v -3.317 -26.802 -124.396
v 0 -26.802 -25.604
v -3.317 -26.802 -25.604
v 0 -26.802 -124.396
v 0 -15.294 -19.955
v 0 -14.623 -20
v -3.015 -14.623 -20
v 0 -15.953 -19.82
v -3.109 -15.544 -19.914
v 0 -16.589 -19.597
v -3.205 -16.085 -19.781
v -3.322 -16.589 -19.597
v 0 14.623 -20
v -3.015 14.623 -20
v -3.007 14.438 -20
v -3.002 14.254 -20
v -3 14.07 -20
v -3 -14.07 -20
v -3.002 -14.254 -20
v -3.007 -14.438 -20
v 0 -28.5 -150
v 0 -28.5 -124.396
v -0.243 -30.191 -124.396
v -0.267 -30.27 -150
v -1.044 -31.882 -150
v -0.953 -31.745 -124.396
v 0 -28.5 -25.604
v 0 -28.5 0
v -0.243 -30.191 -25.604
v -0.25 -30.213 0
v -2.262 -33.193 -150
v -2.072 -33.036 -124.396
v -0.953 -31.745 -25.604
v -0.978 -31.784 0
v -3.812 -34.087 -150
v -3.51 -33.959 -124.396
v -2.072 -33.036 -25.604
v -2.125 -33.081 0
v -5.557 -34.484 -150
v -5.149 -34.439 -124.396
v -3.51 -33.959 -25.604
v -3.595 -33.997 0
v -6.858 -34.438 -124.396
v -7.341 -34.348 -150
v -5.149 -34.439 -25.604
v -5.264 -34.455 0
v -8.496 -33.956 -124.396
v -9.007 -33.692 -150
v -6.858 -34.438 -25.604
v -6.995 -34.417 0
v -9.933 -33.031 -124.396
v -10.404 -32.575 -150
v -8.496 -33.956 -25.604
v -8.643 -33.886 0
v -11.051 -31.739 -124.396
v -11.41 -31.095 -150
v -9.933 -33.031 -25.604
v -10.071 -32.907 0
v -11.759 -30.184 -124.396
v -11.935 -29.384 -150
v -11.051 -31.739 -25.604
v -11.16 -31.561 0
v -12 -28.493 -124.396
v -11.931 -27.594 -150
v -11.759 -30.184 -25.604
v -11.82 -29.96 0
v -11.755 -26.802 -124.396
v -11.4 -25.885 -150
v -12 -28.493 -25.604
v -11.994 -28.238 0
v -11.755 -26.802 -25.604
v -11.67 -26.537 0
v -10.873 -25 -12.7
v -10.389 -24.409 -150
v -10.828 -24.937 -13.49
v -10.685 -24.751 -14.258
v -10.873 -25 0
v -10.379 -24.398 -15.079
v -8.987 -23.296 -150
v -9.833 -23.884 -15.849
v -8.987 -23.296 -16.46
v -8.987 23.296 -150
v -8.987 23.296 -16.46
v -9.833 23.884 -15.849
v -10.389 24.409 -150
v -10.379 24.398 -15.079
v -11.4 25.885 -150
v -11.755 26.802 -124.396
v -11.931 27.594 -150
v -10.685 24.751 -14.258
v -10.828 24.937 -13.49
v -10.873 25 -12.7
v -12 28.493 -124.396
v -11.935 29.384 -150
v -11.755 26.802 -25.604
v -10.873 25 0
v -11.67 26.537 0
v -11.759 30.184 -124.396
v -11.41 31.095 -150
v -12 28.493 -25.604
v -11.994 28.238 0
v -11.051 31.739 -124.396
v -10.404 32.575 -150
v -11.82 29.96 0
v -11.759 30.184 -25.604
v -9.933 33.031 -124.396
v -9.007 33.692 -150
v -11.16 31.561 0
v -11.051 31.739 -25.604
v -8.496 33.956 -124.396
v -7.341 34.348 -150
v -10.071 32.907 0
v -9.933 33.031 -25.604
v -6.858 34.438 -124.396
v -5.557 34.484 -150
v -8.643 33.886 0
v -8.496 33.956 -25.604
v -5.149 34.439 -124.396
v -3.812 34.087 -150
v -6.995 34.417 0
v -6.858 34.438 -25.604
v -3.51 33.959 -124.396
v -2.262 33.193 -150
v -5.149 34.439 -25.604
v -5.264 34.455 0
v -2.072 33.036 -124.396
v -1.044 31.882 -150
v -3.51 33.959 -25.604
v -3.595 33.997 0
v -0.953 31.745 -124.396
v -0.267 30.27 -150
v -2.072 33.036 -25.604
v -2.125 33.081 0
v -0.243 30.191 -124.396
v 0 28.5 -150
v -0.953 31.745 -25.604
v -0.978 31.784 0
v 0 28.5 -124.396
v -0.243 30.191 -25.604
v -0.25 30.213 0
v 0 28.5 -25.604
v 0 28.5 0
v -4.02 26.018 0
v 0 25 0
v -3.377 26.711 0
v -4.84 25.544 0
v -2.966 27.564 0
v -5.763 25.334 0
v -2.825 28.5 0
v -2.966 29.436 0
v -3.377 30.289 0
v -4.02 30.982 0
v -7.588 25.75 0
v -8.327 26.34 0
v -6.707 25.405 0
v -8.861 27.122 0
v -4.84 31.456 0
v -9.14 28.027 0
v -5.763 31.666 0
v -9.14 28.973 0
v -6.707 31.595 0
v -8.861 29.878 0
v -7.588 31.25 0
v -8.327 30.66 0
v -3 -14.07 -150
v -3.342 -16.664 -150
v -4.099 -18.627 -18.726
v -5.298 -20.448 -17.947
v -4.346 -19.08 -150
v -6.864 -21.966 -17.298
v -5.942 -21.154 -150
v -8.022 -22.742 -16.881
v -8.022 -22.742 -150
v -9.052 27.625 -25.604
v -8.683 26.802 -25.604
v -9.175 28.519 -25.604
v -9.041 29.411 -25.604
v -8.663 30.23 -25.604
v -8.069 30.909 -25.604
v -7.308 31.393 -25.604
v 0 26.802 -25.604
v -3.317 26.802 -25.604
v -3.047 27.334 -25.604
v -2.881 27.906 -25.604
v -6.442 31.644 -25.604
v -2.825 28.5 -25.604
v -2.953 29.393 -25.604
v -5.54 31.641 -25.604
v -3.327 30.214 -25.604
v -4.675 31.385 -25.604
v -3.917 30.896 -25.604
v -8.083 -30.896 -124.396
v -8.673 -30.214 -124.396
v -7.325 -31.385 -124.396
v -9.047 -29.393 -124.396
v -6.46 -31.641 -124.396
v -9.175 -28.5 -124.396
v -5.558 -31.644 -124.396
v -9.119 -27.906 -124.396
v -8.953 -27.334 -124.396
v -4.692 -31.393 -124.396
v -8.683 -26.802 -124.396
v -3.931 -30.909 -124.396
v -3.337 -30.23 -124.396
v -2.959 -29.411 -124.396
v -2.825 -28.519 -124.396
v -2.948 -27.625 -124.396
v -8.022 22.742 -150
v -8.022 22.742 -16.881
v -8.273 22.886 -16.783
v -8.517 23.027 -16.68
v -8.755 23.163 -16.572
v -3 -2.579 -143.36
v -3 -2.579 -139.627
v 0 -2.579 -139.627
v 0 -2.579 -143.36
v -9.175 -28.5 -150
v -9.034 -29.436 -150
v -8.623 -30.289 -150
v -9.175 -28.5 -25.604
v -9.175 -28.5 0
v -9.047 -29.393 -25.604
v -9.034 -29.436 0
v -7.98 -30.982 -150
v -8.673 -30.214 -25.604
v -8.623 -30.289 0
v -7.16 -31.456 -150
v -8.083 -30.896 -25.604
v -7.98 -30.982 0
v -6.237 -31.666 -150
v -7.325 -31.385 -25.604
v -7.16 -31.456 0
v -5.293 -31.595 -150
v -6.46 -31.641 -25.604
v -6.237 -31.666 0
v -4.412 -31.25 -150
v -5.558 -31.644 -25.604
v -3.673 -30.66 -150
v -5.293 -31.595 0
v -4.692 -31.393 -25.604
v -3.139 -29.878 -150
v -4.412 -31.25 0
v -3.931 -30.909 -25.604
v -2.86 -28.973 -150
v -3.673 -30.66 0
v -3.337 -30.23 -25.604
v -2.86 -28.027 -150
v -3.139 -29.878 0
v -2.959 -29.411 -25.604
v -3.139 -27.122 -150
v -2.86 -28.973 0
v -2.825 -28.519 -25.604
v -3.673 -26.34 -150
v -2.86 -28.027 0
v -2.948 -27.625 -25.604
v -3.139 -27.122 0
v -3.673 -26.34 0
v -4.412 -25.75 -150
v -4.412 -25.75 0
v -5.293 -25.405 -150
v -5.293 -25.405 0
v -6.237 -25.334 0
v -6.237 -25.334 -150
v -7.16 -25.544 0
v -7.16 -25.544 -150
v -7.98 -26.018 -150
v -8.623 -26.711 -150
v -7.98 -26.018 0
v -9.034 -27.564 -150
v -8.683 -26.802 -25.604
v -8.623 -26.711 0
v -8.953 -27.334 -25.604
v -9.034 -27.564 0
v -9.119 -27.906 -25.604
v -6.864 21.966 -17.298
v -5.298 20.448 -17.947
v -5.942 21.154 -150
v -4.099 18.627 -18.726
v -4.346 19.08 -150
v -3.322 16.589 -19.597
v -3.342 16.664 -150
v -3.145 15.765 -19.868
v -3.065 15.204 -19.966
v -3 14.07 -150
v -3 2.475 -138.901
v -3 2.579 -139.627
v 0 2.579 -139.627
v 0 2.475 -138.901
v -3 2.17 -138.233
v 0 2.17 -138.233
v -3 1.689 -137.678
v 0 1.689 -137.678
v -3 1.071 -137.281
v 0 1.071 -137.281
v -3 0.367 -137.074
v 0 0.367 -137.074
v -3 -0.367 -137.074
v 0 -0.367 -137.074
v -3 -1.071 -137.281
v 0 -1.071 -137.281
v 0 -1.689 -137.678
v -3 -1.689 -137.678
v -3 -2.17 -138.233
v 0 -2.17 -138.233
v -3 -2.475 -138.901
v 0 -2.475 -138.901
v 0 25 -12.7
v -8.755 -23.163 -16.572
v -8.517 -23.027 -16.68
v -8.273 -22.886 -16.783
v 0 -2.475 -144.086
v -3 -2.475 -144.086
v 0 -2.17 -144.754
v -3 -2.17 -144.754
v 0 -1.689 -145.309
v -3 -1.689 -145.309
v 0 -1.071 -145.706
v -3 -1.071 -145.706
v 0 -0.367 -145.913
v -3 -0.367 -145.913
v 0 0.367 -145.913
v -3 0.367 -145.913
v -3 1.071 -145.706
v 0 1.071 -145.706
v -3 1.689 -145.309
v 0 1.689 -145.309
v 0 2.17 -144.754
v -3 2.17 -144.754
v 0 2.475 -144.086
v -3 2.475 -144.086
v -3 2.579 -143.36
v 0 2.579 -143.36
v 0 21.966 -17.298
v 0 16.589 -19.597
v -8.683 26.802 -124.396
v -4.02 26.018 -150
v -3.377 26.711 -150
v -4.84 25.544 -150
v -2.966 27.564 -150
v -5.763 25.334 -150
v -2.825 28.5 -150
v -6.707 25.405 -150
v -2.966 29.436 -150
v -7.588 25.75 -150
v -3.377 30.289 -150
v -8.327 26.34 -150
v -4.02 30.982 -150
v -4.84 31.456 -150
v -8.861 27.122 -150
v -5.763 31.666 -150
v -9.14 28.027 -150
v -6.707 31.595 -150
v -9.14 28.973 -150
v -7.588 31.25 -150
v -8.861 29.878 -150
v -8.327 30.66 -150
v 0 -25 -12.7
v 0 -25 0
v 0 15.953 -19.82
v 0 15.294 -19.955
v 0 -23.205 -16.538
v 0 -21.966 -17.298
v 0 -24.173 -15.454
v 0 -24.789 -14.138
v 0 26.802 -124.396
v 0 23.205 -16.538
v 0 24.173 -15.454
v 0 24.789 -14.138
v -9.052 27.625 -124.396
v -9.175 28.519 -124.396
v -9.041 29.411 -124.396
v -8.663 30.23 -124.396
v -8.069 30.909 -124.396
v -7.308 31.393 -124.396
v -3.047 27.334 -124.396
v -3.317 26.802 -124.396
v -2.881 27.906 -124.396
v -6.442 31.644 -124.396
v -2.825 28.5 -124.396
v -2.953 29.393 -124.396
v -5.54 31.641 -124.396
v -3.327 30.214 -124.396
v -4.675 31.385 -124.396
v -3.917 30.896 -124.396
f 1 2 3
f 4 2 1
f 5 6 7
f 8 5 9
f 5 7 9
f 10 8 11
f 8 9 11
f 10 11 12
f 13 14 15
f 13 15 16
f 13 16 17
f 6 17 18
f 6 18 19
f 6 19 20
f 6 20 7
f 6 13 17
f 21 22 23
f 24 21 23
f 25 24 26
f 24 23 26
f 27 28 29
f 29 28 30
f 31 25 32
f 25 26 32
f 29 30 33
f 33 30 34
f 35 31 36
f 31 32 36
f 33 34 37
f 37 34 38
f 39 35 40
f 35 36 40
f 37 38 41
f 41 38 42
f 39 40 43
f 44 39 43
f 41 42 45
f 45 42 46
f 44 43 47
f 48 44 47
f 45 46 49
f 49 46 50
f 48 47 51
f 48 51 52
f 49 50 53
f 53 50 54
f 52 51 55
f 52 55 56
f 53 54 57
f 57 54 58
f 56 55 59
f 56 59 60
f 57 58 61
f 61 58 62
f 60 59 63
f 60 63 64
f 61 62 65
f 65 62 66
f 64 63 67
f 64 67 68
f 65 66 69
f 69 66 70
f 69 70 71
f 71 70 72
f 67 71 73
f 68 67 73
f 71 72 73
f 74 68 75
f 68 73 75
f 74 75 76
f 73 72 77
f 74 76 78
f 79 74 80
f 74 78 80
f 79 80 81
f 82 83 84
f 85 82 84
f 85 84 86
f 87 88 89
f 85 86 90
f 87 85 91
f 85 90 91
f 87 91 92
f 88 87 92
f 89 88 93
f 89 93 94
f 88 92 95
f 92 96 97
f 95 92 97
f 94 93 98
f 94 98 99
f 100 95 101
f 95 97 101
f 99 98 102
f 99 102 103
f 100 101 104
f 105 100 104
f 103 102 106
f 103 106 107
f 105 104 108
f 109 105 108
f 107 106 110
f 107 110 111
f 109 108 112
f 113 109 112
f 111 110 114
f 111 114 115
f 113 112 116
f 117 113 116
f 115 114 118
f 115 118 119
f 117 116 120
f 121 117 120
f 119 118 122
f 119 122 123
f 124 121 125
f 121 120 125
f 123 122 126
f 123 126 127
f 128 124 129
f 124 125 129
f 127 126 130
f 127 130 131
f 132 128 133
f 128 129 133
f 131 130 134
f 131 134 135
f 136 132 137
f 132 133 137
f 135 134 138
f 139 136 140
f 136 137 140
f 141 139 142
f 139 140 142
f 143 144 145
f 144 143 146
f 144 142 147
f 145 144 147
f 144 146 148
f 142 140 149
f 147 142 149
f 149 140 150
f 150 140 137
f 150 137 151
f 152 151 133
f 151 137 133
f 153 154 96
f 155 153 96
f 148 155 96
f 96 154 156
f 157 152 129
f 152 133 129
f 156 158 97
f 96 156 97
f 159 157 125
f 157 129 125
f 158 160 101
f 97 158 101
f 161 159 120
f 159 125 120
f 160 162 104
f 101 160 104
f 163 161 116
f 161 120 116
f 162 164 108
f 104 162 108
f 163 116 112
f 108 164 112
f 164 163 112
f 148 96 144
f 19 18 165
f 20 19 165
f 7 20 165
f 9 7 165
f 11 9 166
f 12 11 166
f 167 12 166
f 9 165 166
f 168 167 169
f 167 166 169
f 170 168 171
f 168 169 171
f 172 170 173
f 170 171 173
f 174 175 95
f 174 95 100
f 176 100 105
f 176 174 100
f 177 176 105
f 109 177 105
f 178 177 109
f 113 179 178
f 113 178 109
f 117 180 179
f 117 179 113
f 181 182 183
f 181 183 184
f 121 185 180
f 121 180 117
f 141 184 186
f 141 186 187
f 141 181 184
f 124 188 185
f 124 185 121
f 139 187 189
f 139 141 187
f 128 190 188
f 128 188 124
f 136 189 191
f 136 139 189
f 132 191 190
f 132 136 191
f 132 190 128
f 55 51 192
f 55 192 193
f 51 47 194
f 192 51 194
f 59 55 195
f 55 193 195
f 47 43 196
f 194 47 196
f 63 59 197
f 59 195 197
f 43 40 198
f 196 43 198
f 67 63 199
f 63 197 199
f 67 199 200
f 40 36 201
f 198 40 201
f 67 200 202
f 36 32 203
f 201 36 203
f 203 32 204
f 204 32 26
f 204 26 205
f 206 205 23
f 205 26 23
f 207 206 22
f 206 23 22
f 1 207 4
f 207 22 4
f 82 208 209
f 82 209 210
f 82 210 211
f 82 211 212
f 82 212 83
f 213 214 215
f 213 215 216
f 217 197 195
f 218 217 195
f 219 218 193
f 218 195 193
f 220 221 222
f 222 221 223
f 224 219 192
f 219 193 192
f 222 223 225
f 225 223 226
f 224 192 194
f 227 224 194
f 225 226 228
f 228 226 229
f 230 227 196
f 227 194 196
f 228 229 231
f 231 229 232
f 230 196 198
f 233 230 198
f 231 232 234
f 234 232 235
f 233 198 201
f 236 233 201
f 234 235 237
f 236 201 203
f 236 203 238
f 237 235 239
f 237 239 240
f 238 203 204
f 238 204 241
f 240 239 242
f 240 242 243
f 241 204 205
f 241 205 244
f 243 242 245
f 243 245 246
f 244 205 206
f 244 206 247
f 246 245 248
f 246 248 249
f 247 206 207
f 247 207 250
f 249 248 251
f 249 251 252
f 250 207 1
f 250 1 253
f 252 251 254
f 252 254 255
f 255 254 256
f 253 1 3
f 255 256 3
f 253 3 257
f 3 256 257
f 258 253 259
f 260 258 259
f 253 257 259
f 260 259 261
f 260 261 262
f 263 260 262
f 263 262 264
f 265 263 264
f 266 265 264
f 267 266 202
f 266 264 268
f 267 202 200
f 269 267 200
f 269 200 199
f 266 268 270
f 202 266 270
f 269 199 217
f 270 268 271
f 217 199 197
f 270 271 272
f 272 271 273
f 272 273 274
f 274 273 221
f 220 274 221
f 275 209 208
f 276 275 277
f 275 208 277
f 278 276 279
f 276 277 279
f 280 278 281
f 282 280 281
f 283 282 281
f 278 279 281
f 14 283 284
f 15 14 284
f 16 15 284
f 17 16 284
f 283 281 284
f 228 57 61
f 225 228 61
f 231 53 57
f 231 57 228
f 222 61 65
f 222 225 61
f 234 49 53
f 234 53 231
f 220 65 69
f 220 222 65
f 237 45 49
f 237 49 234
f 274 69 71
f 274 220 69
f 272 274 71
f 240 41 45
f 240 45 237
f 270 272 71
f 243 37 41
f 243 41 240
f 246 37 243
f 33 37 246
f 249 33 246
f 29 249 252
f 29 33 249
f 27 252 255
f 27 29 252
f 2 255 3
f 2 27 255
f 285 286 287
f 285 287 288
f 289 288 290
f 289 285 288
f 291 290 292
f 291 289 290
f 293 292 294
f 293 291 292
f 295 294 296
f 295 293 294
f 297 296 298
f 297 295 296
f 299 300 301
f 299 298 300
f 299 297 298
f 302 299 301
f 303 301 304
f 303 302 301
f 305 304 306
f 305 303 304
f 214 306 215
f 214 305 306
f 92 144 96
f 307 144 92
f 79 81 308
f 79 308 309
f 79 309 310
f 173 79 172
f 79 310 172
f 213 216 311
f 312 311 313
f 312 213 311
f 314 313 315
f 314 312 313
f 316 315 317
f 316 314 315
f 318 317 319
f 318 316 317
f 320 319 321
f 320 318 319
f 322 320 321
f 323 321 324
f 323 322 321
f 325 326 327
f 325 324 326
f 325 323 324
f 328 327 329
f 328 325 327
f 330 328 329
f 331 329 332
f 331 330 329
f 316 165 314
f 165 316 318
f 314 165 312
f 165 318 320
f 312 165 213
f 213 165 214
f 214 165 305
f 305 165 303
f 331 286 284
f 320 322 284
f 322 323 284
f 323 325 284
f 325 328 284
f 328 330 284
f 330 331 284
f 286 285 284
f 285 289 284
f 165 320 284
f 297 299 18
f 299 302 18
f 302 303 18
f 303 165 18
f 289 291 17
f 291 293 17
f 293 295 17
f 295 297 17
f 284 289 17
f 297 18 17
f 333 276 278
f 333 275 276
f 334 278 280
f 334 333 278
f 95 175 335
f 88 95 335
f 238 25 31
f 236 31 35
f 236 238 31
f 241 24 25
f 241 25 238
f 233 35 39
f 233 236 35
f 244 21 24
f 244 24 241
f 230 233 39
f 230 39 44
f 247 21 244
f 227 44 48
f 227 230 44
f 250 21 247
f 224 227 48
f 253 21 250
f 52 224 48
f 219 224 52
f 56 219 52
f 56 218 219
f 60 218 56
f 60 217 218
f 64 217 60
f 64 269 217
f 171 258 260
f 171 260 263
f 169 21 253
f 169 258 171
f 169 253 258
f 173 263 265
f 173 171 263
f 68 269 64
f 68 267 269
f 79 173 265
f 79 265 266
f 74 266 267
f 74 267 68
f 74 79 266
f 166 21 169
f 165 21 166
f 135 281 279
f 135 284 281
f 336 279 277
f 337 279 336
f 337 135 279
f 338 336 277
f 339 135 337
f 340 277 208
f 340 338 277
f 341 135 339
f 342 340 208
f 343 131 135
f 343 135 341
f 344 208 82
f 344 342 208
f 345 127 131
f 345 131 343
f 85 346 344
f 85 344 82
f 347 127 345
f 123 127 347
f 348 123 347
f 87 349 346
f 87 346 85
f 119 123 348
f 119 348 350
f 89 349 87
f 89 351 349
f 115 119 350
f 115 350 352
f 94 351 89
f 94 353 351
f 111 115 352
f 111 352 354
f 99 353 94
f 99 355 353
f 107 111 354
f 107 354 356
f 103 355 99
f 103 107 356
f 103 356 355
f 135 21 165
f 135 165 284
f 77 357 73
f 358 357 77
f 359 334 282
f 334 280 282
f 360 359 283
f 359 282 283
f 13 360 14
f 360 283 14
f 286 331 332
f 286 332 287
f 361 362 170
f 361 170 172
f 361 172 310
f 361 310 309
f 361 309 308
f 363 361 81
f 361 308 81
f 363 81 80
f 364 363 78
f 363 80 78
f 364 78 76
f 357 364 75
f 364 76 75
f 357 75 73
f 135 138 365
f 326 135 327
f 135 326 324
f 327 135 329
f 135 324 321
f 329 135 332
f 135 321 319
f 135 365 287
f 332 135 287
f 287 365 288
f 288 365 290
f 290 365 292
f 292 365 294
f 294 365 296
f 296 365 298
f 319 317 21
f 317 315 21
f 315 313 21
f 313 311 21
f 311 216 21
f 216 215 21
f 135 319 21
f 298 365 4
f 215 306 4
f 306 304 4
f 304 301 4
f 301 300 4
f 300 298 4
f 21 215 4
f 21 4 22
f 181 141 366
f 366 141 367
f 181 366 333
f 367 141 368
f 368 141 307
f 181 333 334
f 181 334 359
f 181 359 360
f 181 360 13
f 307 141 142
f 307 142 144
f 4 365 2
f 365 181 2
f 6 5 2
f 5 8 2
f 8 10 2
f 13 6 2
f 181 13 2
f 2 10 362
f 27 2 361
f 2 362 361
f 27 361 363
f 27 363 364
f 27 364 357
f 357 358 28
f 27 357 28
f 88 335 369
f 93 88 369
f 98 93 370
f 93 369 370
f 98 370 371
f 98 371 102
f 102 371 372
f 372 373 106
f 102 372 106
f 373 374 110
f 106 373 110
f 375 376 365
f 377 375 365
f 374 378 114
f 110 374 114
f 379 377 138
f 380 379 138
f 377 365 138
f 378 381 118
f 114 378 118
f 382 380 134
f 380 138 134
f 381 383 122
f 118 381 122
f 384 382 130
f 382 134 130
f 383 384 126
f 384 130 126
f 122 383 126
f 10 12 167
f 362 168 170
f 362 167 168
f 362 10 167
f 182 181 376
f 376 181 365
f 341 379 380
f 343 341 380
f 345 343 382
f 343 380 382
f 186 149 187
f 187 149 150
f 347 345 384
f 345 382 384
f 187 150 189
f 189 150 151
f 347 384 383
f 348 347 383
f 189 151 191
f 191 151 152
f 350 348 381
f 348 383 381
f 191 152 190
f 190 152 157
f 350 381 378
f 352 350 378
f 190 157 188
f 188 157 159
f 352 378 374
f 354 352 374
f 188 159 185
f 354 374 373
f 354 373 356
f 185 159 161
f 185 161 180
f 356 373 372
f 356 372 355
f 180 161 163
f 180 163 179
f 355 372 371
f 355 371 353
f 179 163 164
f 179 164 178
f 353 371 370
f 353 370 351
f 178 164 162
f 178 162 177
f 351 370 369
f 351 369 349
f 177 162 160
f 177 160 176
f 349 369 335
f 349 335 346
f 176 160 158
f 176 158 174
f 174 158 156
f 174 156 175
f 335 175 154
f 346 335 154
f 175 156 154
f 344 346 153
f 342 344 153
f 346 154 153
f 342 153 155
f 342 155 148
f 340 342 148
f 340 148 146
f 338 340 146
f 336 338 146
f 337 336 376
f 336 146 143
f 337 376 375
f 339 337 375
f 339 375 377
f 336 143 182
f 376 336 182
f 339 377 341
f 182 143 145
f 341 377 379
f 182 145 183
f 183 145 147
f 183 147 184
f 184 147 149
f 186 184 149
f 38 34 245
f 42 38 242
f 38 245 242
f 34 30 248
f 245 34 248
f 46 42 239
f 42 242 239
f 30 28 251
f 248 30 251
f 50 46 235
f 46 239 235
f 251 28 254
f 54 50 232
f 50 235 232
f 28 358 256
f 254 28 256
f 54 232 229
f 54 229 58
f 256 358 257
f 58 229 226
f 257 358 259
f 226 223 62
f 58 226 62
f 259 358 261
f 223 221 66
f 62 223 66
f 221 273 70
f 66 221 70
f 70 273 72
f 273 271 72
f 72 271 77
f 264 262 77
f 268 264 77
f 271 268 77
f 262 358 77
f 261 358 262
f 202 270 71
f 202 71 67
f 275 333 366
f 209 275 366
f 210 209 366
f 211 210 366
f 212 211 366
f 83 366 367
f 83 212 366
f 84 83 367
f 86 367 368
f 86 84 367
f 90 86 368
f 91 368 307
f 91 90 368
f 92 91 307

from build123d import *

# Parameters (mm, degrees)
CROQUIS1_R              = 3.175
SALIENTE_EXTRUIR1_DEPTH = 150
REDONDEO1_R             = 10
CORTAR_EXTRUIR1_DEPTH   = 155.383451186
REDONDEO2_R             = 5
CROQUIS3_W              = 98.791812306
CROQUIS3_H              = 18.145434914
CORTAR_EXTRUIR2_DEPTH   = 155.383451313
CORTAR_EXTRUIR3_DEPTH   = 155.179278889


with BuildPart() as part:
    # Croquis1 → Saliente-Extruir1 (new body)
    with BuildSketch(Plane.XY):
        with BuildLine():
            Line((-3, 19.859827637), (-8.98691391, 23.296314259))
            ThreePointArc((-8.98691391, 23.296314259), (-9.006535925, 33.69237342), (0, 28.5))
            Line((0, 28.5), (0, -28.5))
            ThreePointArc((0, -28.5), (-9.006535925, -33.69237342), (-8.98691391, -23.296314259))
            Line((-8.98691391, -23.296314259), (-3, -19.859827637))
            Line((-3, -19.859827637), (-3, 19.859827637))
        make_face()
        with Locations((-6, 28.5)):
            Circle(CROQUIS1_R, mode=Mode.SUBTRACT)
        with Locations(Location((-6, -28.5, 0), (0, 0, 180))):
            Circle(CROQUIS1_R, mode=Mode.SUBTRACT)
    extrude(amount=-SALIENTE_EXTRUIR1_DEPTH)

    # Redondeo1
    redondeo1_edges = [part.edges().sort_by_distance(p)[0] for p in [
        (-3, -19.859827637, -75),
        (-3, 19.859827637, -75),
    ]]
    fillet(redondeo1_edges, radius=REDONDEO1_R)

    # Croquis2 → Cortar-Extruir1 (cut, through all)
    with BuildSketch(Plane(origin=(0, 0, 0), x_dir=(0, 0, -1), z_dir=(1, 0, 0))):
        Polygon((16, 25), (20, 15.646846929), (20, -15.646846929), (16, -25), (-29.873538988, -25), (-29.873538988, 25), align=None)
    extrude(amount=-CORTAR_EXTRUIR1_DEPTH, mode=Mode.SUBTRACT)

    # Redondeo2
    redondeo2_edges = [part.edges().sort_by_distance(p)[0] for p in [
        (-1.562589533, 15.646846929, -20),
        (-1.562589533, -15.646846929, -20),
        (-5.436698586, -25, -16),
        (-5.436698586, 25, -16),
    ]]
    fillet(redondeo2_edges, radius=REDONDEO2_R)

    # Croquis3 → Cortar-Extruir2 (cut, through all)
    with BuildSketch(Plane(origin=(0, 0, 0), x_dir=(0, 0, -1), z_dir=(1, 0, 0))):
        with Locations((75, 35.875128035)):
            Rectangle(CROQUIS3_W, CROQUIS3_H)
        with Locations((75, -35.875128035)):
            Rectangle(CROQUIS3_W, CROQUIS3_H)
    extrude(amount=-CORTAR_EXTRUIR2_DEPTH, mode=Mode.SUBTRACT)

    # Croquis4 → Cortar-Extruir3 (cut, through all)
    with BuildSketch(Plane.ZY.offset(3)):
        with BuildLine():
            Line((-143.359821197, 2.579074159), (-139.627206237, 2.579074159))
            ThreePointArc((-139.627206237, 2.579074159), (-137.048132079, 0), (-139.627206237, -2.579074159))
            Line((-139.627206237, -2.579074159), (-143.359821197, -2.579074159))
            ThreePointArc((-143.359821197, -2.579074159), (-145.938895356, 0), (-143.359821197, 2.579074159))
        make_face()
    extrude(amount=-CORTAR_EXTRUIR3_DEPTH, mode=Mode.SUBTRACT)


solid = part.part
